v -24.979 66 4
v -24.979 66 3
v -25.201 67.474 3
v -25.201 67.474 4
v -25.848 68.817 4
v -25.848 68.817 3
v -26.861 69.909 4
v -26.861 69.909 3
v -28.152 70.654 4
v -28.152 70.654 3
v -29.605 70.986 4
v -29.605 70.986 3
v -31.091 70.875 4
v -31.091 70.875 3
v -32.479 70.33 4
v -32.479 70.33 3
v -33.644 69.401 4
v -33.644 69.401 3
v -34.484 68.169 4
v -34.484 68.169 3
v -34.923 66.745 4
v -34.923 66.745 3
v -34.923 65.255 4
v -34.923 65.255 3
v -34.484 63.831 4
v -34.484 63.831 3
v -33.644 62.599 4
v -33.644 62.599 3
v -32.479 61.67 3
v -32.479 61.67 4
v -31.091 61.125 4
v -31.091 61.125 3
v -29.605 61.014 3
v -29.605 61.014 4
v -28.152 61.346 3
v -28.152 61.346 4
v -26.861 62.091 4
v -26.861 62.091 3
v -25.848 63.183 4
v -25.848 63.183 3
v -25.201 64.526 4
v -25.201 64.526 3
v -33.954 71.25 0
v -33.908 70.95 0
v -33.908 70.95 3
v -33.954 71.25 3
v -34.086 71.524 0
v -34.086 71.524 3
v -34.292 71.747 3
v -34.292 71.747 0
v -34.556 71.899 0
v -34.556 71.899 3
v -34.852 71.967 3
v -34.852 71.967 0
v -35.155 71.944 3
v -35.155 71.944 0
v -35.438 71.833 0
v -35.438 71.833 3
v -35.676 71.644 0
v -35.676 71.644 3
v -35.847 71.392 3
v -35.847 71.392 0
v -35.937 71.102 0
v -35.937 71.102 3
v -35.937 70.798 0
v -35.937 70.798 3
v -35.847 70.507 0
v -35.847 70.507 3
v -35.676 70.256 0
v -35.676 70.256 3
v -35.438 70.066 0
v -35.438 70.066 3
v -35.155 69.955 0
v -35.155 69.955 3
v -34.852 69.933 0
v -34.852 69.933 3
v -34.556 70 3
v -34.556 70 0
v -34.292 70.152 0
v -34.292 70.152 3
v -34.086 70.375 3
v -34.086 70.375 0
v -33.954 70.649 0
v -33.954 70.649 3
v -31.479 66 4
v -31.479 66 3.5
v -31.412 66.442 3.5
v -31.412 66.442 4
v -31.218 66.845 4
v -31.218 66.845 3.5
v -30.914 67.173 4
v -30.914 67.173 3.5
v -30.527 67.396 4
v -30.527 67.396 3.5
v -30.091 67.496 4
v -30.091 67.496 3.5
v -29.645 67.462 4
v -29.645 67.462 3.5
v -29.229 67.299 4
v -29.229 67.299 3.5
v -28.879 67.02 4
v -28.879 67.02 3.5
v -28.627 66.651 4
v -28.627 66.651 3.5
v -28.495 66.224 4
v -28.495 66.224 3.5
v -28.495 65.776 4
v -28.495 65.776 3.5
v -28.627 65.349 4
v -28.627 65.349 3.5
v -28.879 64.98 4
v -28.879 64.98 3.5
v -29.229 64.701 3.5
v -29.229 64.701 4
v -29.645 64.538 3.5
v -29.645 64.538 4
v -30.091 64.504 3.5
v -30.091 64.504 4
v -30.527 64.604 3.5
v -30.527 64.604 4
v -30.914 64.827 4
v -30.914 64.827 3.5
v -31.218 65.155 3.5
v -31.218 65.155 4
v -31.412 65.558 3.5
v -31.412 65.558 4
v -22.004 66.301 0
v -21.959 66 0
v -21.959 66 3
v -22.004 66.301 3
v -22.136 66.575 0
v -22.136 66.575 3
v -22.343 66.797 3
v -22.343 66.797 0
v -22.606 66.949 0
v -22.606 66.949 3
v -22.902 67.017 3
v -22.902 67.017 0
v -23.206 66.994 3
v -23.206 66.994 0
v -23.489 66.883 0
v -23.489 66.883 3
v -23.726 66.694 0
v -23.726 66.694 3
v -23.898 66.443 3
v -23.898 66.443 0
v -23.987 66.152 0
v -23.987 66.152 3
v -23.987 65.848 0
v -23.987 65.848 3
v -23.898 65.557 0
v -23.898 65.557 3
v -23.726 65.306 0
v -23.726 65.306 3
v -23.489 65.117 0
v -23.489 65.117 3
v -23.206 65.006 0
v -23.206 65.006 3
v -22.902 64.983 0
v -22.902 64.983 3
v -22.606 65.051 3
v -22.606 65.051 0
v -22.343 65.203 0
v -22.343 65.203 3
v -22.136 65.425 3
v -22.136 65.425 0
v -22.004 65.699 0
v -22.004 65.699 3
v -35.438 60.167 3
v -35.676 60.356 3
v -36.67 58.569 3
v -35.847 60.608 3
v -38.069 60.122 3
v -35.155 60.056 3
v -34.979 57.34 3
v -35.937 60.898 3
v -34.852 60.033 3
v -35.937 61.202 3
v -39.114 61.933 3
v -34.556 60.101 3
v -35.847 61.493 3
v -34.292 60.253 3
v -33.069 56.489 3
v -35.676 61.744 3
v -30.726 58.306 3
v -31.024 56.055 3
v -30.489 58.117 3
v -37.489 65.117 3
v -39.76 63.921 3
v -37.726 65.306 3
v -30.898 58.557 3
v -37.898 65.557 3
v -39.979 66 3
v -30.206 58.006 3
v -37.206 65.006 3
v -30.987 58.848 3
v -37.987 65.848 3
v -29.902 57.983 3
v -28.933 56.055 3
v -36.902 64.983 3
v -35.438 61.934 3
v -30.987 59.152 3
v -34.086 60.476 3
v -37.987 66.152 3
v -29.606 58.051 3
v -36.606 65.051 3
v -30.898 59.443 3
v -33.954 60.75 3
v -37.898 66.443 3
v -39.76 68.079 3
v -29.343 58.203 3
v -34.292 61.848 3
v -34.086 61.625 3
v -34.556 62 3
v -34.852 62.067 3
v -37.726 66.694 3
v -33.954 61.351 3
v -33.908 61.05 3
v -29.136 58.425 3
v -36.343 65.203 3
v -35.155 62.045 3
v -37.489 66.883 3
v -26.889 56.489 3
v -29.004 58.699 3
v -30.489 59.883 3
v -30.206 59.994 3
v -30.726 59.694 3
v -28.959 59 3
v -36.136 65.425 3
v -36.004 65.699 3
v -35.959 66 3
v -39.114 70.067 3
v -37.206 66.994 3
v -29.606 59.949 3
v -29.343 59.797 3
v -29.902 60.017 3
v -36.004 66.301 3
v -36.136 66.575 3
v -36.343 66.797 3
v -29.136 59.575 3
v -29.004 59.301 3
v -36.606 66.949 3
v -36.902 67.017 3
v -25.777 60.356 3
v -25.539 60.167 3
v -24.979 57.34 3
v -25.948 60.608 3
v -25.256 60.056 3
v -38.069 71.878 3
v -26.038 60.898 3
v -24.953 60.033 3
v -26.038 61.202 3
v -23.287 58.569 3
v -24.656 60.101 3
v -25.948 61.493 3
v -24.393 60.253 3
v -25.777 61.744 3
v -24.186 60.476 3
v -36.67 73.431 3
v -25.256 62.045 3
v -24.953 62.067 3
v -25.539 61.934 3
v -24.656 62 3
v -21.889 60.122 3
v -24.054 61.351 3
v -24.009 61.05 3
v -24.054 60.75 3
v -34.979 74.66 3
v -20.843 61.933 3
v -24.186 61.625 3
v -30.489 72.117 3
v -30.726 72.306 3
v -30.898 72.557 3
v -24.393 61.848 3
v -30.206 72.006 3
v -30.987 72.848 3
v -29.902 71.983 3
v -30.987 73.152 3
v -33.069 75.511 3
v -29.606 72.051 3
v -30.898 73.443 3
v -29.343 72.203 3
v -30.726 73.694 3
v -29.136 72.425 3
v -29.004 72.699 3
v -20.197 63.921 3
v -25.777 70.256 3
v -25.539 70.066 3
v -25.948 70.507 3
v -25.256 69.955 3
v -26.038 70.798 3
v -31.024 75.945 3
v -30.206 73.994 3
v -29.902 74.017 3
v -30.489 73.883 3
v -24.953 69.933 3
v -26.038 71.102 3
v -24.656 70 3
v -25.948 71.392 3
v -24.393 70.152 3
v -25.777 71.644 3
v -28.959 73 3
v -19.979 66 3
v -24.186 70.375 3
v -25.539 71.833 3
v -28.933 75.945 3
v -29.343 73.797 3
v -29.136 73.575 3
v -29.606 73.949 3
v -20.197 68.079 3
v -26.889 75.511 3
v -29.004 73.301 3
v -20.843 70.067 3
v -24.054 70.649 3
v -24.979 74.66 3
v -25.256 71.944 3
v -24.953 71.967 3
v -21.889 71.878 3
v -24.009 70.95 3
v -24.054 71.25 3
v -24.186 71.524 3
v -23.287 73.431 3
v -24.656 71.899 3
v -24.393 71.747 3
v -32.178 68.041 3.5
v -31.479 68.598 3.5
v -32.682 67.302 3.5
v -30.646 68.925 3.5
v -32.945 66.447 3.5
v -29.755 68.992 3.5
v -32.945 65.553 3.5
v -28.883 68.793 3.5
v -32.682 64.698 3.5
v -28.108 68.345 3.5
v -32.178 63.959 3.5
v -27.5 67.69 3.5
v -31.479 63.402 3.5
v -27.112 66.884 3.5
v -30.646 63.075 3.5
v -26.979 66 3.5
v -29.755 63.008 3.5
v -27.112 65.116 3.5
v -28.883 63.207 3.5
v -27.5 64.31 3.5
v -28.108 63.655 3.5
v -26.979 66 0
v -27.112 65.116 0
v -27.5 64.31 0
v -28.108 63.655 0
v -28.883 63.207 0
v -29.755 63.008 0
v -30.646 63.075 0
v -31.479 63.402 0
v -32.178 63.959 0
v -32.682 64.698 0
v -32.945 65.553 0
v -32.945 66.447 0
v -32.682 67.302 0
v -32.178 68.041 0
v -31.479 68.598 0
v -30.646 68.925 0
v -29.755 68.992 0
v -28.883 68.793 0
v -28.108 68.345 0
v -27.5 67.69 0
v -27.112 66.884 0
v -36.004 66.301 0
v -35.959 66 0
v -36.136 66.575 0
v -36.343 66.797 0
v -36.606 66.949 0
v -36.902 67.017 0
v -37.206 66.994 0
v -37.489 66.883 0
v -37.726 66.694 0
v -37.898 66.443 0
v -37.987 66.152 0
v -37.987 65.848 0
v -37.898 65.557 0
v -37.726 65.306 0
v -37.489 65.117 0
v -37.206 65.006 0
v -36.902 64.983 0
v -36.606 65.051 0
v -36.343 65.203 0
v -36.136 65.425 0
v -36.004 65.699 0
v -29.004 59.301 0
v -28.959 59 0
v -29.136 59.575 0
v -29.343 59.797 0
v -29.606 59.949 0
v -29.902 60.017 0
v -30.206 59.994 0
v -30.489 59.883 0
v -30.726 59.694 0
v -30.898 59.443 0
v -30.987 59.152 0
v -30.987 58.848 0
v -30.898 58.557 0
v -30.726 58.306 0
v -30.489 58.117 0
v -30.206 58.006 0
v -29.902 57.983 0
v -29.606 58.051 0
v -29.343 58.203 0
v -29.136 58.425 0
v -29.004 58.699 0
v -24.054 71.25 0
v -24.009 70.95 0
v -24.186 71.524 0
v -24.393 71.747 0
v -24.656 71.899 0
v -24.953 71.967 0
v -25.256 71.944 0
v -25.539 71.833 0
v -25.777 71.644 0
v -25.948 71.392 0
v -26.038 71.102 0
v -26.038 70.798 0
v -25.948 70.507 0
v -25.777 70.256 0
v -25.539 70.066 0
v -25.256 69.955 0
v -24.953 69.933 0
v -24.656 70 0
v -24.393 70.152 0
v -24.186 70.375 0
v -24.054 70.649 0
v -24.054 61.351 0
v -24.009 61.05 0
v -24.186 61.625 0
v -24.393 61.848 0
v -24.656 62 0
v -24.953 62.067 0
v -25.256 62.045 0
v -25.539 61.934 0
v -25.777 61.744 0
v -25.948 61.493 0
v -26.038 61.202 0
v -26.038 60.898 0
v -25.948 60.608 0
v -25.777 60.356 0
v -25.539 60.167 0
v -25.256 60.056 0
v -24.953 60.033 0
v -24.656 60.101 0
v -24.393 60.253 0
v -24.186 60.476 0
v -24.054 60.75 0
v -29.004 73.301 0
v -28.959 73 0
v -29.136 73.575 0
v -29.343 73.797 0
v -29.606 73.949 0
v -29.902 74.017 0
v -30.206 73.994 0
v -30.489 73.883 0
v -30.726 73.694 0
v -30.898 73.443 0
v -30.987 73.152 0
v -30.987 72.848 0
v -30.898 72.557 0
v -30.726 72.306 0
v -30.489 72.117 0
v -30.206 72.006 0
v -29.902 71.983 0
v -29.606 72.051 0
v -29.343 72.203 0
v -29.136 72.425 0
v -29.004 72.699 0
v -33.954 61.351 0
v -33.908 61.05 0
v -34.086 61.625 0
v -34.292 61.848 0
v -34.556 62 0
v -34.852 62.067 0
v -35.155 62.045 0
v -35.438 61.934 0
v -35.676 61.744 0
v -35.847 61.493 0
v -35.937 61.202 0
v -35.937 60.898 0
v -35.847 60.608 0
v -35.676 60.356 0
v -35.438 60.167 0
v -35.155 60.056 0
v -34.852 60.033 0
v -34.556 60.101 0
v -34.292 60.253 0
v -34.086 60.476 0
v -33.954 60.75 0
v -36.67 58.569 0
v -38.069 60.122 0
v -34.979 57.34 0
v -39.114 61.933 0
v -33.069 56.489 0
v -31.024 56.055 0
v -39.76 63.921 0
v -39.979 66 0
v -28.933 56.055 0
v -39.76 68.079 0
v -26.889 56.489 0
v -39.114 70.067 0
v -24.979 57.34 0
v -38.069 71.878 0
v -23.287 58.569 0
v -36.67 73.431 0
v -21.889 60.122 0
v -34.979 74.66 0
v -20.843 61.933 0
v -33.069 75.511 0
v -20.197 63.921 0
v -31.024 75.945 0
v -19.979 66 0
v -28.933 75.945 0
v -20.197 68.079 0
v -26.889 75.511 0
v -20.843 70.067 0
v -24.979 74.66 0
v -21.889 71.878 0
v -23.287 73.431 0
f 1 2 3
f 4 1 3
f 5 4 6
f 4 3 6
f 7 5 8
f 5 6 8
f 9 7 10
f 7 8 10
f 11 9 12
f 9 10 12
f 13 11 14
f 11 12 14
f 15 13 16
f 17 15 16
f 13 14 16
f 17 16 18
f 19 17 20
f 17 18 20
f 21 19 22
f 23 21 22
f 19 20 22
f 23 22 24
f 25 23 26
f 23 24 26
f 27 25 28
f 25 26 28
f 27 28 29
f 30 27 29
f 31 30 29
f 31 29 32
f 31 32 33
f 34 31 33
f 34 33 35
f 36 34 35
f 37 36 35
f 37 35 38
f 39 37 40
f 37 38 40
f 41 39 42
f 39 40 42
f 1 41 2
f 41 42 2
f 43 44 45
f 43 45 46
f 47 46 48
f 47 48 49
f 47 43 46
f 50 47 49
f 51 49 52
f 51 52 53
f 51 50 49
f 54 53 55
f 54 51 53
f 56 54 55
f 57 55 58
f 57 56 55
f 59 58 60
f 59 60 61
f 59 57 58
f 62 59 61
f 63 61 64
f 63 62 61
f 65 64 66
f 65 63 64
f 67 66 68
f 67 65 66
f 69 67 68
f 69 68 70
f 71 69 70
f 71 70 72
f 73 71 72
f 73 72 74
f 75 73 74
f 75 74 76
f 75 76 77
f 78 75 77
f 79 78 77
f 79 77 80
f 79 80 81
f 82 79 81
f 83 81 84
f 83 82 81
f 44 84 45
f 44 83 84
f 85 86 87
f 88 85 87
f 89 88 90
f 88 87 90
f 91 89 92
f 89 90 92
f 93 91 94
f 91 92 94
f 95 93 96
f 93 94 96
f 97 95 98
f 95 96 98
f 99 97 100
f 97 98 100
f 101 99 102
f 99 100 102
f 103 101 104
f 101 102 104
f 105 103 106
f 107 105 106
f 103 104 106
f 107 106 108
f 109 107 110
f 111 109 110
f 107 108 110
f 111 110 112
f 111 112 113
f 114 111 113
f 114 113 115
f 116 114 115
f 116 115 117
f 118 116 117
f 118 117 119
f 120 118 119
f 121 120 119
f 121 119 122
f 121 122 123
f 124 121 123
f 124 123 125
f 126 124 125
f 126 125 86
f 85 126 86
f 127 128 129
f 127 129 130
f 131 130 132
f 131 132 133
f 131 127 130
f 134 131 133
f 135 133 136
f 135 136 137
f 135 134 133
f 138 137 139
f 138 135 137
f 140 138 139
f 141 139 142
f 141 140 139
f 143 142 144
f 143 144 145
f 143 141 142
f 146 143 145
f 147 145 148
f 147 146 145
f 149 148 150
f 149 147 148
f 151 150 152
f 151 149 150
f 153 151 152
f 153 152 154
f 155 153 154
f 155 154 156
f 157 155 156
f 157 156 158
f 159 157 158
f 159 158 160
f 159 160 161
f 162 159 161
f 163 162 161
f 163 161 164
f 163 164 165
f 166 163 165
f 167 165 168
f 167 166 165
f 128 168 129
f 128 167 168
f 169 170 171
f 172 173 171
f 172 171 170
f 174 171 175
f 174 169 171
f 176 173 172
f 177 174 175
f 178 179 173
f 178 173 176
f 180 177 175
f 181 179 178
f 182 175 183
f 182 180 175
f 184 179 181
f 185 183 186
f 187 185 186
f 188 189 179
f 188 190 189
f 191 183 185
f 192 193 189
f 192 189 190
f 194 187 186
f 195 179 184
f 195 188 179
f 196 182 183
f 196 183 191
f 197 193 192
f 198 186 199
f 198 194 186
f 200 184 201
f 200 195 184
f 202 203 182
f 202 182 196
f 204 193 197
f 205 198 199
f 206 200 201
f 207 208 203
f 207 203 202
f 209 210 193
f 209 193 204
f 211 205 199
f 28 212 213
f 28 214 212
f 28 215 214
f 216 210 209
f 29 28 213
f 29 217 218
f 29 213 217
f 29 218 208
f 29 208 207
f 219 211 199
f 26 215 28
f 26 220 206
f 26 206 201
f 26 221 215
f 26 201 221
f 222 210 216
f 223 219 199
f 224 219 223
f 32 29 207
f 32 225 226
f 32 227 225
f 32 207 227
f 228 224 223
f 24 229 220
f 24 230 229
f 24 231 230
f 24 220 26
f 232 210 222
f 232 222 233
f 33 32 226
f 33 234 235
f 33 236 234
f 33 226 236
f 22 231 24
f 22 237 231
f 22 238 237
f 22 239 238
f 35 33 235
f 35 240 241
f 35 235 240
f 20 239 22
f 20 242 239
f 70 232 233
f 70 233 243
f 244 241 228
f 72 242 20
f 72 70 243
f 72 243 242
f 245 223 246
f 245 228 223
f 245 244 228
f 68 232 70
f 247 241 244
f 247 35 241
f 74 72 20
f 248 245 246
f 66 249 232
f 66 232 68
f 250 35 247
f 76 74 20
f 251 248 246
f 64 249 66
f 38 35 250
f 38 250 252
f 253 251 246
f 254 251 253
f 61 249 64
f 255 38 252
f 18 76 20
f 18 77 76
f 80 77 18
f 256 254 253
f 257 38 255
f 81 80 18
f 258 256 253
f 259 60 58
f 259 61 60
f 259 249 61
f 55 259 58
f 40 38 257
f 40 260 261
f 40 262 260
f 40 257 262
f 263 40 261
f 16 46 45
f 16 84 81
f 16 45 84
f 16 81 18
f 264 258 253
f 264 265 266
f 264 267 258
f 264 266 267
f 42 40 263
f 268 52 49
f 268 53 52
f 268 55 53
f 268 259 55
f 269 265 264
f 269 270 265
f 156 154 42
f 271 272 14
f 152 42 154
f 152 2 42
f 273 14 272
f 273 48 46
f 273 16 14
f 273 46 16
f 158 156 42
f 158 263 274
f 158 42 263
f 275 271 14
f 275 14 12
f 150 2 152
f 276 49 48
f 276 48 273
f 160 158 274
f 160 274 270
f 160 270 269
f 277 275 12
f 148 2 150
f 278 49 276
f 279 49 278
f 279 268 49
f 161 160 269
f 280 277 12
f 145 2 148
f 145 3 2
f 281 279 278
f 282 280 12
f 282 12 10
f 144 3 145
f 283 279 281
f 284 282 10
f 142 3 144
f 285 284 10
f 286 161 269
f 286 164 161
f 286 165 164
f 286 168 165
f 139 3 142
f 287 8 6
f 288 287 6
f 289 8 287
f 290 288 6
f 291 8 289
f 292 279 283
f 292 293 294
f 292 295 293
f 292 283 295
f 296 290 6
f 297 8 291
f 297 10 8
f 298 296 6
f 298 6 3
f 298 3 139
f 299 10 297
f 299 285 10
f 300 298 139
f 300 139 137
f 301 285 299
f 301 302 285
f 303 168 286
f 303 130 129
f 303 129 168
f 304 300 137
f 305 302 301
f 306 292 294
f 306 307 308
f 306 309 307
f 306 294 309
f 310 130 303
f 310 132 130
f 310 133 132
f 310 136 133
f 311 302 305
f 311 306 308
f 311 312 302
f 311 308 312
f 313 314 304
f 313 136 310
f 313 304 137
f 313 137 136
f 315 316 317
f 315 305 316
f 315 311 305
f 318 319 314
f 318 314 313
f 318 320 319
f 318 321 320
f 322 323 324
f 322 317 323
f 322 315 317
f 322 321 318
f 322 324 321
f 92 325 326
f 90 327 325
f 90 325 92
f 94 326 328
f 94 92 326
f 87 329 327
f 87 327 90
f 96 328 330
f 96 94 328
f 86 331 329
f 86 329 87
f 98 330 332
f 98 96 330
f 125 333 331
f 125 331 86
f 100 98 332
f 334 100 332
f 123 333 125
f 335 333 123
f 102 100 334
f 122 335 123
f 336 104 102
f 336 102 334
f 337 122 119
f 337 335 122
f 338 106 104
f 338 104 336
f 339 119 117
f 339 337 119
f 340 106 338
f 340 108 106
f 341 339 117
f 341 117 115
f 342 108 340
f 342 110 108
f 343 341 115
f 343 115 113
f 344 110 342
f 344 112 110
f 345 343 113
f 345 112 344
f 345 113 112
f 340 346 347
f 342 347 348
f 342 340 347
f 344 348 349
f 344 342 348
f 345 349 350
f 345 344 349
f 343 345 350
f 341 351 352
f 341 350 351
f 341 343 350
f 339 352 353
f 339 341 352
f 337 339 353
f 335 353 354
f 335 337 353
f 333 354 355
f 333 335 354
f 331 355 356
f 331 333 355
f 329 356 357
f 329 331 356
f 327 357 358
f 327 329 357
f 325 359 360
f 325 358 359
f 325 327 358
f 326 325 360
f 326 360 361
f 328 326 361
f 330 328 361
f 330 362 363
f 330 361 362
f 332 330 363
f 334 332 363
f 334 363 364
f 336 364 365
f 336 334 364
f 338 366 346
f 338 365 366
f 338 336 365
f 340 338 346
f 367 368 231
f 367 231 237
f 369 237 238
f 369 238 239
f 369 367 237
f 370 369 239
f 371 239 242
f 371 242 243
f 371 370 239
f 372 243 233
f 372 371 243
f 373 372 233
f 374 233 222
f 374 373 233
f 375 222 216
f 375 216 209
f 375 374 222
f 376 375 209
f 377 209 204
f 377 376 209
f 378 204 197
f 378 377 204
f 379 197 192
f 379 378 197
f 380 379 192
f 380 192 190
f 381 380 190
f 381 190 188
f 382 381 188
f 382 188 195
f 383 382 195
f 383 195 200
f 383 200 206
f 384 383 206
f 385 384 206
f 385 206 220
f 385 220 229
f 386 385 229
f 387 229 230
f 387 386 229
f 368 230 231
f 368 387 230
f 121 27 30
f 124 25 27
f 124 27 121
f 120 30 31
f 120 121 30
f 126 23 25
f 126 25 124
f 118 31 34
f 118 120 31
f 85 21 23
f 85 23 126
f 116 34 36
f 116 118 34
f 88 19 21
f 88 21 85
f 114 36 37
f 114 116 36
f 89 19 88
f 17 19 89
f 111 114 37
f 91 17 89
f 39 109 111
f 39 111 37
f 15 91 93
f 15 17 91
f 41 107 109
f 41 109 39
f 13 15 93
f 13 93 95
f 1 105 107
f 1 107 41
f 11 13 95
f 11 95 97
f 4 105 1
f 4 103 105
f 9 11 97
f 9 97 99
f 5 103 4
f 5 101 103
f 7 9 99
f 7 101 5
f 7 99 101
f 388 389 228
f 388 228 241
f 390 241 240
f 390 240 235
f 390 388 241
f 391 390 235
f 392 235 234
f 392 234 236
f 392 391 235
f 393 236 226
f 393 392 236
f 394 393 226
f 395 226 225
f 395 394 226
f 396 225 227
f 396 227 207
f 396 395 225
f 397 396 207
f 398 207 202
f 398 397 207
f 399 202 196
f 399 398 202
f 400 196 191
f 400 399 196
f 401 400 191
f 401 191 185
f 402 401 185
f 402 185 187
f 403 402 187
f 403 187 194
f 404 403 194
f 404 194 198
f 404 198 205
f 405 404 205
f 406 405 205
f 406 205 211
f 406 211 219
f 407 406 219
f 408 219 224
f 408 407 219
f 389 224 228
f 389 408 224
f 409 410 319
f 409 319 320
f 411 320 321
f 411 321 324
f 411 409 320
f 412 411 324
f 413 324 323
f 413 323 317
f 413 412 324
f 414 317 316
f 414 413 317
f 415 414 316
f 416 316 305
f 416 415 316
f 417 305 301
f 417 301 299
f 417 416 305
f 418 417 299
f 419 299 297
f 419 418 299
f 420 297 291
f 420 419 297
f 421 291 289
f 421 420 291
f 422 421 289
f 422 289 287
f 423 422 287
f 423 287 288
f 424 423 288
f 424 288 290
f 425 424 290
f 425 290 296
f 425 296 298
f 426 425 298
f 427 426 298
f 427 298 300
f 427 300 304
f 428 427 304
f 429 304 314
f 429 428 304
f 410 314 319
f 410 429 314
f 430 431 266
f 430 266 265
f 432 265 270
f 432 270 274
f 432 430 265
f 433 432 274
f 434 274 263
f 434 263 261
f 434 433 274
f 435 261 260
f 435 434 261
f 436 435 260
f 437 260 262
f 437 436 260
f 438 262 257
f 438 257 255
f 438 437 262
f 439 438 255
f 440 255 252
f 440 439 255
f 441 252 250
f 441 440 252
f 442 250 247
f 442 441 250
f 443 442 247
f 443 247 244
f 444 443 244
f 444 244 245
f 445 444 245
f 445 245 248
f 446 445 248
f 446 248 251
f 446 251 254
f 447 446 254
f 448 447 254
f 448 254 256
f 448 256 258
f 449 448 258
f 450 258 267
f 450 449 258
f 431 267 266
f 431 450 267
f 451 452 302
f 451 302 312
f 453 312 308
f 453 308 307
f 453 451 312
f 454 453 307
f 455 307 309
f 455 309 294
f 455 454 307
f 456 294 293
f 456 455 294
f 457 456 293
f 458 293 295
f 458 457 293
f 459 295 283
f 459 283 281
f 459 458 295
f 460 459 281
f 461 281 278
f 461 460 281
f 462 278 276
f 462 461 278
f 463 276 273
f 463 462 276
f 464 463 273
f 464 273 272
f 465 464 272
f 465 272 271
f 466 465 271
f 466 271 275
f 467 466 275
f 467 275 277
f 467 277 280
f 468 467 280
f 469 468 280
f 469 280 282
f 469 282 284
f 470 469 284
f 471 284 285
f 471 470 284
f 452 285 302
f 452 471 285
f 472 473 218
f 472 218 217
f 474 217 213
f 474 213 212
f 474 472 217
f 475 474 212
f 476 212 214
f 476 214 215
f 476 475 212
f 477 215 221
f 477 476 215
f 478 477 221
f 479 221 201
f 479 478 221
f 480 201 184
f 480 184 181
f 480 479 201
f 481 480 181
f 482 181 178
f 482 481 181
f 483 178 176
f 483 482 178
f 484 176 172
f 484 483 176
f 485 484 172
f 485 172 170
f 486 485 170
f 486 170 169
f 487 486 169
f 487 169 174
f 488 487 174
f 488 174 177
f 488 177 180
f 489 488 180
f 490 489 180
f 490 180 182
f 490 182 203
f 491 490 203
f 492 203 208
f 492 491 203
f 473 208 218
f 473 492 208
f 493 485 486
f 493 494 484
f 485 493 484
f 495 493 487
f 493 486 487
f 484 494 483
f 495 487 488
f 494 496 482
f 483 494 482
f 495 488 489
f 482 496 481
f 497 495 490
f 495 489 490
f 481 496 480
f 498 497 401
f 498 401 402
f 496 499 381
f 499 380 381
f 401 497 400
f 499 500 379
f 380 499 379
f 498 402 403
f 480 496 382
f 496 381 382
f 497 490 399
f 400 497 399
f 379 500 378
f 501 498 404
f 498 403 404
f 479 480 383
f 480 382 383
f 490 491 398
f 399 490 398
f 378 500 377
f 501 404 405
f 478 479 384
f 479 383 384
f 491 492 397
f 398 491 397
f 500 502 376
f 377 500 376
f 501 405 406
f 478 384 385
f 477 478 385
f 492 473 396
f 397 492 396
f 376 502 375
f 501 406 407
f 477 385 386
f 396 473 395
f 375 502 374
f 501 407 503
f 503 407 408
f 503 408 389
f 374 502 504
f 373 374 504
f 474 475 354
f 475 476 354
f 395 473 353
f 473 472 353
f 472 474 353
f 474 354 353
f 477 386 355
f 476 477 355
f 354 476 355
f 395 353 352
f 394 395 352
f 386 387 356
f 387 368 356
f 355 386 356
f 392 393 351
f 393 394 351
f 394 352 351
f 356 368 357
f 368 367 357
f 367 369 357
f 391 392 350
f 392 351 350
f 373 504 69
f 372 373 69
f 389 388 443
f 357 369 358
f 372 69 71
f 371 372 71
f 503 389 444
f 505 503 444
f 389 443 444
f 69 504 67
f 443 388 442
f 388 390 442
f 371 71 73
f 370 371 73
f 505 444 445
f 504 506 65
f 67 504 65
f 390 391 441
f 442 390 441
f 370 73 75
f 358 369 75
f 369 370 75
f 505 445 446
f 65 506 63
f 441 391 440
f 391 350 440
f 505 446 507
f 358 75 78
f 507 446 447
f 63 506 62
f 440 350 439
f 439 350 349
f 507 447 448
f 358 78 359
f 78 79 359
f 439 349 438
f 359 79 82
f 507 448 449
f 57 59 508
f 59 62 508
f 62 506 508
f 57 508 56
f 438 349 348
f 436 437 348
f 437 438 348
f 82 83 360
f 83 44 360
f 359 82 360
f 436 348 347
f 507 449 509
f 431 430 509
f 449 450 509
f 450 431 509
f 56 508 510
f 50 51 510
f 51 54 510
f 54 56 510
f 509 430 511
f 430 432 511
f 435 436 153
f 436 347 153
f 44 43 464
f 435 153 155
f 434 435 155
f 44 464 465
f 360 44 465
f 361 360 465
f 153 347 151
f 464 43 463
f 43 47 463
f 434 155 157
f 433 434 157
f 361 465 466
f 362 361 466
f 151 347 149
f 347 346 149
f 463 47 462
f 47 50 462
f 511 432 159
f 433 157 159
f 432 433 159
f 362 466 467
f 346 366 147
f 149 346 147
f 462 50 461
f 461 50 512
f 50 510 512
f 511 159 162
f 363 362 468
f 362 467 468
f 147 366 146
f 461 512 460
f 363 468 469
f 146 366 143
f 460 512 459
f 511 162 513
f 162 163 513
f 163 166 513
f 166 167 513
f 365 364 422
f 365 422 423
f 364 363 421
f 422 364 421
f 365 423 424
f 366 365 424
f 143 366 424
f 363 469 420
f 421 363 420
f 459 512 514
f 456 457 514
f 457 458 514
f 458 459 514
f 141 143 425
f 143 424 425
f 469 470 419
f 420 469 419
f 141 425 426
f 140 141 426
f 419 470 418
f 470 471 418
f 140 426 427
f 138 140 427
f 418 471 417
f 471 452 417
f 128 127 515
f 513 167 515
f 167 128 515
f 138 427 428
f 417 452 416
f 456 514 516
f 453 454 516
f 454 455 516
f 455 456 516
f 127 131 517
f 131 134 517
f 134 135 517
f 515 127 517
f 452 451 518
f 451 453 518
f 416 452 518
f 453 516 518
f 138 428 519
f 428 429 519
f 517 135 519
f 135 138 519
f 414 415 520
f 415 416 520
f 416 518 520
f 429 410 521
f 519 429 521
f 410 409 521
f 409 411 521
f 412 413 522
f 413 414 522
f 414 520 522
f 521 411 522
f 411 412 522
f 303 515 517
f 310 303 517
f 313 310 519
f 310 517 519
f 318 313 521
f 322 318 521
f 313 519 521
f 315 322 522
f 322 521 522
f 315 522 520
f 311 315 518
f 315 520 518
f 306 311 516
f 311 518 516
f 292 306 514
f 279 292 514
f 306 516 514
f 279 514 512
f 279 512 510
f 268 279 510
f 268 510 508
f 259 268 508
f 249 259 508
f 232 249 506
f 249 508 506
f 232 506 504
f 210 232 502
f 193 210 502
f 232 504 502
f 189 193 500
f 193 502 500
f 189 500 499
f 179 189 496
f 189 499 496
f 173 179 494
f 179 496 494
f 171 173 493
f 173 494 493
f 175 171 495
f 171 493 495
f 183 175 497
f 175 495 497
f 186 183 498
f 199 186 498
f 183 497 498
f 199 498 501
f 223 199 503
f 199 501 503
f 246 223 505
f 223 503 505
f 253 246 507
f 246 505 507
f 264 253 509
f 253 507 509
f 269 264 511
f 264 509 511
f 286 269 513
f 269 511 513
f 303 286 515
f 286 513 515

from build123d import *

# Parameters (mm, degrees)
SKETCH_1_R               = 10
SKETCH_1_R_2             = 1.02
SKETCH_1_R_3             = 1.5
EXTRUDE_1_DEPTH          = 3
SKETCH_2_R               = 5
EXTRUDE_2_DEPTH          = 1
CUT_EXTRUDE_1_DEPTH      = 10
CUT_EXTRUDE_1_DEPTH_BACK = 0.5
SKETCH_3_R               = 3
SKETCH_4_R               = 1.5
CUT_EXTRUDE_2_DEPTH      = 8.5


with BuildPart() as part:
    # ｽｹｯﾁ1 → ﾎﾞｽ - 押し出し1 (new body)
    with BuildSketch(Plane.XY):
        with Locations((-29.978703949, 66)):
            Circle(SKETCH_1_R)
        with Locations((-25.028956481, 61.050252532)):
            Circle(SKETCH_1_R_2, mode=Mode.SUBTRACT)
        with Locations((-29.978703949, 59)):
            Circle(SKETCH_1_R_2, mode=Mode.SUBTRACT)
        with Locations((-34.928451418, 61.050252532)):
            Circle(SKETCH_1_R_2, mode=Mode.SUBTRACT)
        with Locations((-36.978703949, 66)):
            Circle(SKETCH_1_R_2, mode=Mode.SUBTRACT)
        with Locations((-34.928451418, 70.949747468)):
            Circle(SKETCH_1_R_2, mode=Mode.SUBTRACT)
        with Locations((-29.978703949, 73)):
            Circle(SKETCH_1_R_2, mode=Mode.SUBTRACT)
        with Locations((-25.028956481, 70.949747468)):
            Circle(SKETCH_1_R_2, mode=Mode.SUBTRACT)
        with Locations((-22.978703949, 66)):
            Circle(SKETCH_1_R_2, mode=Mode.SUBTRACT)
        with Locations((-29.978703949, 66)):
            Circle(SKETCH_1_R_3, mode=Mode.SUBTRACT)
    extrude(amount=EXTRUDE_1_DEPTH)

    # ｽｹｯﾁ2 → ﾎﾞｽ - 押し出し2 (add)
    with BuildSketch(Plane.XY.offset(3)):
        with Locations((-29.978703949, 66)):
            Circle(SKETCH_2_R)
    extrude(amount=EXTRUDE_2_DEPTH)

    # ｽｹｯﾁ3 → ｶｯﾄ - 押し出し1 (cut, two sides: drawn at the far end of the back side and taken through both)
    with BuildSketch(Plane(origin=(0, 0, 3), x_dir=(-1, 0, 0), z_dir=(0, 0, -1)).offset(-CUT_EXTRUDE_1_DEPTH_BACK)):
        with Locations(Location((29.978703949, 66, 0), (0, 0, 180))):
            Circle(SKETCH_3_R)
    extrude(amount=CUT_EXTRUDE_1_DEPTH + CUT_EXTRUDE_1_DEPTH_BACK, mode=Mode.SUBTRACT)

    # ｽｹｯﾁ4 → ｶｯﾄ - 押し出し2 (cut)
    with BuildSketch(Plane(origin=(0, 0, 3.5), x_dir=(-1, 0, 0), z_dir=(0, 0, -1))):
        with Locations((29.978703949, 66)):
            Circle(SKETCH_4_R)
    extrude(amount=-CUT_EXTRUDE_2_DEPTH, mode=Mode.SUBTRACT)


solid = part.part
